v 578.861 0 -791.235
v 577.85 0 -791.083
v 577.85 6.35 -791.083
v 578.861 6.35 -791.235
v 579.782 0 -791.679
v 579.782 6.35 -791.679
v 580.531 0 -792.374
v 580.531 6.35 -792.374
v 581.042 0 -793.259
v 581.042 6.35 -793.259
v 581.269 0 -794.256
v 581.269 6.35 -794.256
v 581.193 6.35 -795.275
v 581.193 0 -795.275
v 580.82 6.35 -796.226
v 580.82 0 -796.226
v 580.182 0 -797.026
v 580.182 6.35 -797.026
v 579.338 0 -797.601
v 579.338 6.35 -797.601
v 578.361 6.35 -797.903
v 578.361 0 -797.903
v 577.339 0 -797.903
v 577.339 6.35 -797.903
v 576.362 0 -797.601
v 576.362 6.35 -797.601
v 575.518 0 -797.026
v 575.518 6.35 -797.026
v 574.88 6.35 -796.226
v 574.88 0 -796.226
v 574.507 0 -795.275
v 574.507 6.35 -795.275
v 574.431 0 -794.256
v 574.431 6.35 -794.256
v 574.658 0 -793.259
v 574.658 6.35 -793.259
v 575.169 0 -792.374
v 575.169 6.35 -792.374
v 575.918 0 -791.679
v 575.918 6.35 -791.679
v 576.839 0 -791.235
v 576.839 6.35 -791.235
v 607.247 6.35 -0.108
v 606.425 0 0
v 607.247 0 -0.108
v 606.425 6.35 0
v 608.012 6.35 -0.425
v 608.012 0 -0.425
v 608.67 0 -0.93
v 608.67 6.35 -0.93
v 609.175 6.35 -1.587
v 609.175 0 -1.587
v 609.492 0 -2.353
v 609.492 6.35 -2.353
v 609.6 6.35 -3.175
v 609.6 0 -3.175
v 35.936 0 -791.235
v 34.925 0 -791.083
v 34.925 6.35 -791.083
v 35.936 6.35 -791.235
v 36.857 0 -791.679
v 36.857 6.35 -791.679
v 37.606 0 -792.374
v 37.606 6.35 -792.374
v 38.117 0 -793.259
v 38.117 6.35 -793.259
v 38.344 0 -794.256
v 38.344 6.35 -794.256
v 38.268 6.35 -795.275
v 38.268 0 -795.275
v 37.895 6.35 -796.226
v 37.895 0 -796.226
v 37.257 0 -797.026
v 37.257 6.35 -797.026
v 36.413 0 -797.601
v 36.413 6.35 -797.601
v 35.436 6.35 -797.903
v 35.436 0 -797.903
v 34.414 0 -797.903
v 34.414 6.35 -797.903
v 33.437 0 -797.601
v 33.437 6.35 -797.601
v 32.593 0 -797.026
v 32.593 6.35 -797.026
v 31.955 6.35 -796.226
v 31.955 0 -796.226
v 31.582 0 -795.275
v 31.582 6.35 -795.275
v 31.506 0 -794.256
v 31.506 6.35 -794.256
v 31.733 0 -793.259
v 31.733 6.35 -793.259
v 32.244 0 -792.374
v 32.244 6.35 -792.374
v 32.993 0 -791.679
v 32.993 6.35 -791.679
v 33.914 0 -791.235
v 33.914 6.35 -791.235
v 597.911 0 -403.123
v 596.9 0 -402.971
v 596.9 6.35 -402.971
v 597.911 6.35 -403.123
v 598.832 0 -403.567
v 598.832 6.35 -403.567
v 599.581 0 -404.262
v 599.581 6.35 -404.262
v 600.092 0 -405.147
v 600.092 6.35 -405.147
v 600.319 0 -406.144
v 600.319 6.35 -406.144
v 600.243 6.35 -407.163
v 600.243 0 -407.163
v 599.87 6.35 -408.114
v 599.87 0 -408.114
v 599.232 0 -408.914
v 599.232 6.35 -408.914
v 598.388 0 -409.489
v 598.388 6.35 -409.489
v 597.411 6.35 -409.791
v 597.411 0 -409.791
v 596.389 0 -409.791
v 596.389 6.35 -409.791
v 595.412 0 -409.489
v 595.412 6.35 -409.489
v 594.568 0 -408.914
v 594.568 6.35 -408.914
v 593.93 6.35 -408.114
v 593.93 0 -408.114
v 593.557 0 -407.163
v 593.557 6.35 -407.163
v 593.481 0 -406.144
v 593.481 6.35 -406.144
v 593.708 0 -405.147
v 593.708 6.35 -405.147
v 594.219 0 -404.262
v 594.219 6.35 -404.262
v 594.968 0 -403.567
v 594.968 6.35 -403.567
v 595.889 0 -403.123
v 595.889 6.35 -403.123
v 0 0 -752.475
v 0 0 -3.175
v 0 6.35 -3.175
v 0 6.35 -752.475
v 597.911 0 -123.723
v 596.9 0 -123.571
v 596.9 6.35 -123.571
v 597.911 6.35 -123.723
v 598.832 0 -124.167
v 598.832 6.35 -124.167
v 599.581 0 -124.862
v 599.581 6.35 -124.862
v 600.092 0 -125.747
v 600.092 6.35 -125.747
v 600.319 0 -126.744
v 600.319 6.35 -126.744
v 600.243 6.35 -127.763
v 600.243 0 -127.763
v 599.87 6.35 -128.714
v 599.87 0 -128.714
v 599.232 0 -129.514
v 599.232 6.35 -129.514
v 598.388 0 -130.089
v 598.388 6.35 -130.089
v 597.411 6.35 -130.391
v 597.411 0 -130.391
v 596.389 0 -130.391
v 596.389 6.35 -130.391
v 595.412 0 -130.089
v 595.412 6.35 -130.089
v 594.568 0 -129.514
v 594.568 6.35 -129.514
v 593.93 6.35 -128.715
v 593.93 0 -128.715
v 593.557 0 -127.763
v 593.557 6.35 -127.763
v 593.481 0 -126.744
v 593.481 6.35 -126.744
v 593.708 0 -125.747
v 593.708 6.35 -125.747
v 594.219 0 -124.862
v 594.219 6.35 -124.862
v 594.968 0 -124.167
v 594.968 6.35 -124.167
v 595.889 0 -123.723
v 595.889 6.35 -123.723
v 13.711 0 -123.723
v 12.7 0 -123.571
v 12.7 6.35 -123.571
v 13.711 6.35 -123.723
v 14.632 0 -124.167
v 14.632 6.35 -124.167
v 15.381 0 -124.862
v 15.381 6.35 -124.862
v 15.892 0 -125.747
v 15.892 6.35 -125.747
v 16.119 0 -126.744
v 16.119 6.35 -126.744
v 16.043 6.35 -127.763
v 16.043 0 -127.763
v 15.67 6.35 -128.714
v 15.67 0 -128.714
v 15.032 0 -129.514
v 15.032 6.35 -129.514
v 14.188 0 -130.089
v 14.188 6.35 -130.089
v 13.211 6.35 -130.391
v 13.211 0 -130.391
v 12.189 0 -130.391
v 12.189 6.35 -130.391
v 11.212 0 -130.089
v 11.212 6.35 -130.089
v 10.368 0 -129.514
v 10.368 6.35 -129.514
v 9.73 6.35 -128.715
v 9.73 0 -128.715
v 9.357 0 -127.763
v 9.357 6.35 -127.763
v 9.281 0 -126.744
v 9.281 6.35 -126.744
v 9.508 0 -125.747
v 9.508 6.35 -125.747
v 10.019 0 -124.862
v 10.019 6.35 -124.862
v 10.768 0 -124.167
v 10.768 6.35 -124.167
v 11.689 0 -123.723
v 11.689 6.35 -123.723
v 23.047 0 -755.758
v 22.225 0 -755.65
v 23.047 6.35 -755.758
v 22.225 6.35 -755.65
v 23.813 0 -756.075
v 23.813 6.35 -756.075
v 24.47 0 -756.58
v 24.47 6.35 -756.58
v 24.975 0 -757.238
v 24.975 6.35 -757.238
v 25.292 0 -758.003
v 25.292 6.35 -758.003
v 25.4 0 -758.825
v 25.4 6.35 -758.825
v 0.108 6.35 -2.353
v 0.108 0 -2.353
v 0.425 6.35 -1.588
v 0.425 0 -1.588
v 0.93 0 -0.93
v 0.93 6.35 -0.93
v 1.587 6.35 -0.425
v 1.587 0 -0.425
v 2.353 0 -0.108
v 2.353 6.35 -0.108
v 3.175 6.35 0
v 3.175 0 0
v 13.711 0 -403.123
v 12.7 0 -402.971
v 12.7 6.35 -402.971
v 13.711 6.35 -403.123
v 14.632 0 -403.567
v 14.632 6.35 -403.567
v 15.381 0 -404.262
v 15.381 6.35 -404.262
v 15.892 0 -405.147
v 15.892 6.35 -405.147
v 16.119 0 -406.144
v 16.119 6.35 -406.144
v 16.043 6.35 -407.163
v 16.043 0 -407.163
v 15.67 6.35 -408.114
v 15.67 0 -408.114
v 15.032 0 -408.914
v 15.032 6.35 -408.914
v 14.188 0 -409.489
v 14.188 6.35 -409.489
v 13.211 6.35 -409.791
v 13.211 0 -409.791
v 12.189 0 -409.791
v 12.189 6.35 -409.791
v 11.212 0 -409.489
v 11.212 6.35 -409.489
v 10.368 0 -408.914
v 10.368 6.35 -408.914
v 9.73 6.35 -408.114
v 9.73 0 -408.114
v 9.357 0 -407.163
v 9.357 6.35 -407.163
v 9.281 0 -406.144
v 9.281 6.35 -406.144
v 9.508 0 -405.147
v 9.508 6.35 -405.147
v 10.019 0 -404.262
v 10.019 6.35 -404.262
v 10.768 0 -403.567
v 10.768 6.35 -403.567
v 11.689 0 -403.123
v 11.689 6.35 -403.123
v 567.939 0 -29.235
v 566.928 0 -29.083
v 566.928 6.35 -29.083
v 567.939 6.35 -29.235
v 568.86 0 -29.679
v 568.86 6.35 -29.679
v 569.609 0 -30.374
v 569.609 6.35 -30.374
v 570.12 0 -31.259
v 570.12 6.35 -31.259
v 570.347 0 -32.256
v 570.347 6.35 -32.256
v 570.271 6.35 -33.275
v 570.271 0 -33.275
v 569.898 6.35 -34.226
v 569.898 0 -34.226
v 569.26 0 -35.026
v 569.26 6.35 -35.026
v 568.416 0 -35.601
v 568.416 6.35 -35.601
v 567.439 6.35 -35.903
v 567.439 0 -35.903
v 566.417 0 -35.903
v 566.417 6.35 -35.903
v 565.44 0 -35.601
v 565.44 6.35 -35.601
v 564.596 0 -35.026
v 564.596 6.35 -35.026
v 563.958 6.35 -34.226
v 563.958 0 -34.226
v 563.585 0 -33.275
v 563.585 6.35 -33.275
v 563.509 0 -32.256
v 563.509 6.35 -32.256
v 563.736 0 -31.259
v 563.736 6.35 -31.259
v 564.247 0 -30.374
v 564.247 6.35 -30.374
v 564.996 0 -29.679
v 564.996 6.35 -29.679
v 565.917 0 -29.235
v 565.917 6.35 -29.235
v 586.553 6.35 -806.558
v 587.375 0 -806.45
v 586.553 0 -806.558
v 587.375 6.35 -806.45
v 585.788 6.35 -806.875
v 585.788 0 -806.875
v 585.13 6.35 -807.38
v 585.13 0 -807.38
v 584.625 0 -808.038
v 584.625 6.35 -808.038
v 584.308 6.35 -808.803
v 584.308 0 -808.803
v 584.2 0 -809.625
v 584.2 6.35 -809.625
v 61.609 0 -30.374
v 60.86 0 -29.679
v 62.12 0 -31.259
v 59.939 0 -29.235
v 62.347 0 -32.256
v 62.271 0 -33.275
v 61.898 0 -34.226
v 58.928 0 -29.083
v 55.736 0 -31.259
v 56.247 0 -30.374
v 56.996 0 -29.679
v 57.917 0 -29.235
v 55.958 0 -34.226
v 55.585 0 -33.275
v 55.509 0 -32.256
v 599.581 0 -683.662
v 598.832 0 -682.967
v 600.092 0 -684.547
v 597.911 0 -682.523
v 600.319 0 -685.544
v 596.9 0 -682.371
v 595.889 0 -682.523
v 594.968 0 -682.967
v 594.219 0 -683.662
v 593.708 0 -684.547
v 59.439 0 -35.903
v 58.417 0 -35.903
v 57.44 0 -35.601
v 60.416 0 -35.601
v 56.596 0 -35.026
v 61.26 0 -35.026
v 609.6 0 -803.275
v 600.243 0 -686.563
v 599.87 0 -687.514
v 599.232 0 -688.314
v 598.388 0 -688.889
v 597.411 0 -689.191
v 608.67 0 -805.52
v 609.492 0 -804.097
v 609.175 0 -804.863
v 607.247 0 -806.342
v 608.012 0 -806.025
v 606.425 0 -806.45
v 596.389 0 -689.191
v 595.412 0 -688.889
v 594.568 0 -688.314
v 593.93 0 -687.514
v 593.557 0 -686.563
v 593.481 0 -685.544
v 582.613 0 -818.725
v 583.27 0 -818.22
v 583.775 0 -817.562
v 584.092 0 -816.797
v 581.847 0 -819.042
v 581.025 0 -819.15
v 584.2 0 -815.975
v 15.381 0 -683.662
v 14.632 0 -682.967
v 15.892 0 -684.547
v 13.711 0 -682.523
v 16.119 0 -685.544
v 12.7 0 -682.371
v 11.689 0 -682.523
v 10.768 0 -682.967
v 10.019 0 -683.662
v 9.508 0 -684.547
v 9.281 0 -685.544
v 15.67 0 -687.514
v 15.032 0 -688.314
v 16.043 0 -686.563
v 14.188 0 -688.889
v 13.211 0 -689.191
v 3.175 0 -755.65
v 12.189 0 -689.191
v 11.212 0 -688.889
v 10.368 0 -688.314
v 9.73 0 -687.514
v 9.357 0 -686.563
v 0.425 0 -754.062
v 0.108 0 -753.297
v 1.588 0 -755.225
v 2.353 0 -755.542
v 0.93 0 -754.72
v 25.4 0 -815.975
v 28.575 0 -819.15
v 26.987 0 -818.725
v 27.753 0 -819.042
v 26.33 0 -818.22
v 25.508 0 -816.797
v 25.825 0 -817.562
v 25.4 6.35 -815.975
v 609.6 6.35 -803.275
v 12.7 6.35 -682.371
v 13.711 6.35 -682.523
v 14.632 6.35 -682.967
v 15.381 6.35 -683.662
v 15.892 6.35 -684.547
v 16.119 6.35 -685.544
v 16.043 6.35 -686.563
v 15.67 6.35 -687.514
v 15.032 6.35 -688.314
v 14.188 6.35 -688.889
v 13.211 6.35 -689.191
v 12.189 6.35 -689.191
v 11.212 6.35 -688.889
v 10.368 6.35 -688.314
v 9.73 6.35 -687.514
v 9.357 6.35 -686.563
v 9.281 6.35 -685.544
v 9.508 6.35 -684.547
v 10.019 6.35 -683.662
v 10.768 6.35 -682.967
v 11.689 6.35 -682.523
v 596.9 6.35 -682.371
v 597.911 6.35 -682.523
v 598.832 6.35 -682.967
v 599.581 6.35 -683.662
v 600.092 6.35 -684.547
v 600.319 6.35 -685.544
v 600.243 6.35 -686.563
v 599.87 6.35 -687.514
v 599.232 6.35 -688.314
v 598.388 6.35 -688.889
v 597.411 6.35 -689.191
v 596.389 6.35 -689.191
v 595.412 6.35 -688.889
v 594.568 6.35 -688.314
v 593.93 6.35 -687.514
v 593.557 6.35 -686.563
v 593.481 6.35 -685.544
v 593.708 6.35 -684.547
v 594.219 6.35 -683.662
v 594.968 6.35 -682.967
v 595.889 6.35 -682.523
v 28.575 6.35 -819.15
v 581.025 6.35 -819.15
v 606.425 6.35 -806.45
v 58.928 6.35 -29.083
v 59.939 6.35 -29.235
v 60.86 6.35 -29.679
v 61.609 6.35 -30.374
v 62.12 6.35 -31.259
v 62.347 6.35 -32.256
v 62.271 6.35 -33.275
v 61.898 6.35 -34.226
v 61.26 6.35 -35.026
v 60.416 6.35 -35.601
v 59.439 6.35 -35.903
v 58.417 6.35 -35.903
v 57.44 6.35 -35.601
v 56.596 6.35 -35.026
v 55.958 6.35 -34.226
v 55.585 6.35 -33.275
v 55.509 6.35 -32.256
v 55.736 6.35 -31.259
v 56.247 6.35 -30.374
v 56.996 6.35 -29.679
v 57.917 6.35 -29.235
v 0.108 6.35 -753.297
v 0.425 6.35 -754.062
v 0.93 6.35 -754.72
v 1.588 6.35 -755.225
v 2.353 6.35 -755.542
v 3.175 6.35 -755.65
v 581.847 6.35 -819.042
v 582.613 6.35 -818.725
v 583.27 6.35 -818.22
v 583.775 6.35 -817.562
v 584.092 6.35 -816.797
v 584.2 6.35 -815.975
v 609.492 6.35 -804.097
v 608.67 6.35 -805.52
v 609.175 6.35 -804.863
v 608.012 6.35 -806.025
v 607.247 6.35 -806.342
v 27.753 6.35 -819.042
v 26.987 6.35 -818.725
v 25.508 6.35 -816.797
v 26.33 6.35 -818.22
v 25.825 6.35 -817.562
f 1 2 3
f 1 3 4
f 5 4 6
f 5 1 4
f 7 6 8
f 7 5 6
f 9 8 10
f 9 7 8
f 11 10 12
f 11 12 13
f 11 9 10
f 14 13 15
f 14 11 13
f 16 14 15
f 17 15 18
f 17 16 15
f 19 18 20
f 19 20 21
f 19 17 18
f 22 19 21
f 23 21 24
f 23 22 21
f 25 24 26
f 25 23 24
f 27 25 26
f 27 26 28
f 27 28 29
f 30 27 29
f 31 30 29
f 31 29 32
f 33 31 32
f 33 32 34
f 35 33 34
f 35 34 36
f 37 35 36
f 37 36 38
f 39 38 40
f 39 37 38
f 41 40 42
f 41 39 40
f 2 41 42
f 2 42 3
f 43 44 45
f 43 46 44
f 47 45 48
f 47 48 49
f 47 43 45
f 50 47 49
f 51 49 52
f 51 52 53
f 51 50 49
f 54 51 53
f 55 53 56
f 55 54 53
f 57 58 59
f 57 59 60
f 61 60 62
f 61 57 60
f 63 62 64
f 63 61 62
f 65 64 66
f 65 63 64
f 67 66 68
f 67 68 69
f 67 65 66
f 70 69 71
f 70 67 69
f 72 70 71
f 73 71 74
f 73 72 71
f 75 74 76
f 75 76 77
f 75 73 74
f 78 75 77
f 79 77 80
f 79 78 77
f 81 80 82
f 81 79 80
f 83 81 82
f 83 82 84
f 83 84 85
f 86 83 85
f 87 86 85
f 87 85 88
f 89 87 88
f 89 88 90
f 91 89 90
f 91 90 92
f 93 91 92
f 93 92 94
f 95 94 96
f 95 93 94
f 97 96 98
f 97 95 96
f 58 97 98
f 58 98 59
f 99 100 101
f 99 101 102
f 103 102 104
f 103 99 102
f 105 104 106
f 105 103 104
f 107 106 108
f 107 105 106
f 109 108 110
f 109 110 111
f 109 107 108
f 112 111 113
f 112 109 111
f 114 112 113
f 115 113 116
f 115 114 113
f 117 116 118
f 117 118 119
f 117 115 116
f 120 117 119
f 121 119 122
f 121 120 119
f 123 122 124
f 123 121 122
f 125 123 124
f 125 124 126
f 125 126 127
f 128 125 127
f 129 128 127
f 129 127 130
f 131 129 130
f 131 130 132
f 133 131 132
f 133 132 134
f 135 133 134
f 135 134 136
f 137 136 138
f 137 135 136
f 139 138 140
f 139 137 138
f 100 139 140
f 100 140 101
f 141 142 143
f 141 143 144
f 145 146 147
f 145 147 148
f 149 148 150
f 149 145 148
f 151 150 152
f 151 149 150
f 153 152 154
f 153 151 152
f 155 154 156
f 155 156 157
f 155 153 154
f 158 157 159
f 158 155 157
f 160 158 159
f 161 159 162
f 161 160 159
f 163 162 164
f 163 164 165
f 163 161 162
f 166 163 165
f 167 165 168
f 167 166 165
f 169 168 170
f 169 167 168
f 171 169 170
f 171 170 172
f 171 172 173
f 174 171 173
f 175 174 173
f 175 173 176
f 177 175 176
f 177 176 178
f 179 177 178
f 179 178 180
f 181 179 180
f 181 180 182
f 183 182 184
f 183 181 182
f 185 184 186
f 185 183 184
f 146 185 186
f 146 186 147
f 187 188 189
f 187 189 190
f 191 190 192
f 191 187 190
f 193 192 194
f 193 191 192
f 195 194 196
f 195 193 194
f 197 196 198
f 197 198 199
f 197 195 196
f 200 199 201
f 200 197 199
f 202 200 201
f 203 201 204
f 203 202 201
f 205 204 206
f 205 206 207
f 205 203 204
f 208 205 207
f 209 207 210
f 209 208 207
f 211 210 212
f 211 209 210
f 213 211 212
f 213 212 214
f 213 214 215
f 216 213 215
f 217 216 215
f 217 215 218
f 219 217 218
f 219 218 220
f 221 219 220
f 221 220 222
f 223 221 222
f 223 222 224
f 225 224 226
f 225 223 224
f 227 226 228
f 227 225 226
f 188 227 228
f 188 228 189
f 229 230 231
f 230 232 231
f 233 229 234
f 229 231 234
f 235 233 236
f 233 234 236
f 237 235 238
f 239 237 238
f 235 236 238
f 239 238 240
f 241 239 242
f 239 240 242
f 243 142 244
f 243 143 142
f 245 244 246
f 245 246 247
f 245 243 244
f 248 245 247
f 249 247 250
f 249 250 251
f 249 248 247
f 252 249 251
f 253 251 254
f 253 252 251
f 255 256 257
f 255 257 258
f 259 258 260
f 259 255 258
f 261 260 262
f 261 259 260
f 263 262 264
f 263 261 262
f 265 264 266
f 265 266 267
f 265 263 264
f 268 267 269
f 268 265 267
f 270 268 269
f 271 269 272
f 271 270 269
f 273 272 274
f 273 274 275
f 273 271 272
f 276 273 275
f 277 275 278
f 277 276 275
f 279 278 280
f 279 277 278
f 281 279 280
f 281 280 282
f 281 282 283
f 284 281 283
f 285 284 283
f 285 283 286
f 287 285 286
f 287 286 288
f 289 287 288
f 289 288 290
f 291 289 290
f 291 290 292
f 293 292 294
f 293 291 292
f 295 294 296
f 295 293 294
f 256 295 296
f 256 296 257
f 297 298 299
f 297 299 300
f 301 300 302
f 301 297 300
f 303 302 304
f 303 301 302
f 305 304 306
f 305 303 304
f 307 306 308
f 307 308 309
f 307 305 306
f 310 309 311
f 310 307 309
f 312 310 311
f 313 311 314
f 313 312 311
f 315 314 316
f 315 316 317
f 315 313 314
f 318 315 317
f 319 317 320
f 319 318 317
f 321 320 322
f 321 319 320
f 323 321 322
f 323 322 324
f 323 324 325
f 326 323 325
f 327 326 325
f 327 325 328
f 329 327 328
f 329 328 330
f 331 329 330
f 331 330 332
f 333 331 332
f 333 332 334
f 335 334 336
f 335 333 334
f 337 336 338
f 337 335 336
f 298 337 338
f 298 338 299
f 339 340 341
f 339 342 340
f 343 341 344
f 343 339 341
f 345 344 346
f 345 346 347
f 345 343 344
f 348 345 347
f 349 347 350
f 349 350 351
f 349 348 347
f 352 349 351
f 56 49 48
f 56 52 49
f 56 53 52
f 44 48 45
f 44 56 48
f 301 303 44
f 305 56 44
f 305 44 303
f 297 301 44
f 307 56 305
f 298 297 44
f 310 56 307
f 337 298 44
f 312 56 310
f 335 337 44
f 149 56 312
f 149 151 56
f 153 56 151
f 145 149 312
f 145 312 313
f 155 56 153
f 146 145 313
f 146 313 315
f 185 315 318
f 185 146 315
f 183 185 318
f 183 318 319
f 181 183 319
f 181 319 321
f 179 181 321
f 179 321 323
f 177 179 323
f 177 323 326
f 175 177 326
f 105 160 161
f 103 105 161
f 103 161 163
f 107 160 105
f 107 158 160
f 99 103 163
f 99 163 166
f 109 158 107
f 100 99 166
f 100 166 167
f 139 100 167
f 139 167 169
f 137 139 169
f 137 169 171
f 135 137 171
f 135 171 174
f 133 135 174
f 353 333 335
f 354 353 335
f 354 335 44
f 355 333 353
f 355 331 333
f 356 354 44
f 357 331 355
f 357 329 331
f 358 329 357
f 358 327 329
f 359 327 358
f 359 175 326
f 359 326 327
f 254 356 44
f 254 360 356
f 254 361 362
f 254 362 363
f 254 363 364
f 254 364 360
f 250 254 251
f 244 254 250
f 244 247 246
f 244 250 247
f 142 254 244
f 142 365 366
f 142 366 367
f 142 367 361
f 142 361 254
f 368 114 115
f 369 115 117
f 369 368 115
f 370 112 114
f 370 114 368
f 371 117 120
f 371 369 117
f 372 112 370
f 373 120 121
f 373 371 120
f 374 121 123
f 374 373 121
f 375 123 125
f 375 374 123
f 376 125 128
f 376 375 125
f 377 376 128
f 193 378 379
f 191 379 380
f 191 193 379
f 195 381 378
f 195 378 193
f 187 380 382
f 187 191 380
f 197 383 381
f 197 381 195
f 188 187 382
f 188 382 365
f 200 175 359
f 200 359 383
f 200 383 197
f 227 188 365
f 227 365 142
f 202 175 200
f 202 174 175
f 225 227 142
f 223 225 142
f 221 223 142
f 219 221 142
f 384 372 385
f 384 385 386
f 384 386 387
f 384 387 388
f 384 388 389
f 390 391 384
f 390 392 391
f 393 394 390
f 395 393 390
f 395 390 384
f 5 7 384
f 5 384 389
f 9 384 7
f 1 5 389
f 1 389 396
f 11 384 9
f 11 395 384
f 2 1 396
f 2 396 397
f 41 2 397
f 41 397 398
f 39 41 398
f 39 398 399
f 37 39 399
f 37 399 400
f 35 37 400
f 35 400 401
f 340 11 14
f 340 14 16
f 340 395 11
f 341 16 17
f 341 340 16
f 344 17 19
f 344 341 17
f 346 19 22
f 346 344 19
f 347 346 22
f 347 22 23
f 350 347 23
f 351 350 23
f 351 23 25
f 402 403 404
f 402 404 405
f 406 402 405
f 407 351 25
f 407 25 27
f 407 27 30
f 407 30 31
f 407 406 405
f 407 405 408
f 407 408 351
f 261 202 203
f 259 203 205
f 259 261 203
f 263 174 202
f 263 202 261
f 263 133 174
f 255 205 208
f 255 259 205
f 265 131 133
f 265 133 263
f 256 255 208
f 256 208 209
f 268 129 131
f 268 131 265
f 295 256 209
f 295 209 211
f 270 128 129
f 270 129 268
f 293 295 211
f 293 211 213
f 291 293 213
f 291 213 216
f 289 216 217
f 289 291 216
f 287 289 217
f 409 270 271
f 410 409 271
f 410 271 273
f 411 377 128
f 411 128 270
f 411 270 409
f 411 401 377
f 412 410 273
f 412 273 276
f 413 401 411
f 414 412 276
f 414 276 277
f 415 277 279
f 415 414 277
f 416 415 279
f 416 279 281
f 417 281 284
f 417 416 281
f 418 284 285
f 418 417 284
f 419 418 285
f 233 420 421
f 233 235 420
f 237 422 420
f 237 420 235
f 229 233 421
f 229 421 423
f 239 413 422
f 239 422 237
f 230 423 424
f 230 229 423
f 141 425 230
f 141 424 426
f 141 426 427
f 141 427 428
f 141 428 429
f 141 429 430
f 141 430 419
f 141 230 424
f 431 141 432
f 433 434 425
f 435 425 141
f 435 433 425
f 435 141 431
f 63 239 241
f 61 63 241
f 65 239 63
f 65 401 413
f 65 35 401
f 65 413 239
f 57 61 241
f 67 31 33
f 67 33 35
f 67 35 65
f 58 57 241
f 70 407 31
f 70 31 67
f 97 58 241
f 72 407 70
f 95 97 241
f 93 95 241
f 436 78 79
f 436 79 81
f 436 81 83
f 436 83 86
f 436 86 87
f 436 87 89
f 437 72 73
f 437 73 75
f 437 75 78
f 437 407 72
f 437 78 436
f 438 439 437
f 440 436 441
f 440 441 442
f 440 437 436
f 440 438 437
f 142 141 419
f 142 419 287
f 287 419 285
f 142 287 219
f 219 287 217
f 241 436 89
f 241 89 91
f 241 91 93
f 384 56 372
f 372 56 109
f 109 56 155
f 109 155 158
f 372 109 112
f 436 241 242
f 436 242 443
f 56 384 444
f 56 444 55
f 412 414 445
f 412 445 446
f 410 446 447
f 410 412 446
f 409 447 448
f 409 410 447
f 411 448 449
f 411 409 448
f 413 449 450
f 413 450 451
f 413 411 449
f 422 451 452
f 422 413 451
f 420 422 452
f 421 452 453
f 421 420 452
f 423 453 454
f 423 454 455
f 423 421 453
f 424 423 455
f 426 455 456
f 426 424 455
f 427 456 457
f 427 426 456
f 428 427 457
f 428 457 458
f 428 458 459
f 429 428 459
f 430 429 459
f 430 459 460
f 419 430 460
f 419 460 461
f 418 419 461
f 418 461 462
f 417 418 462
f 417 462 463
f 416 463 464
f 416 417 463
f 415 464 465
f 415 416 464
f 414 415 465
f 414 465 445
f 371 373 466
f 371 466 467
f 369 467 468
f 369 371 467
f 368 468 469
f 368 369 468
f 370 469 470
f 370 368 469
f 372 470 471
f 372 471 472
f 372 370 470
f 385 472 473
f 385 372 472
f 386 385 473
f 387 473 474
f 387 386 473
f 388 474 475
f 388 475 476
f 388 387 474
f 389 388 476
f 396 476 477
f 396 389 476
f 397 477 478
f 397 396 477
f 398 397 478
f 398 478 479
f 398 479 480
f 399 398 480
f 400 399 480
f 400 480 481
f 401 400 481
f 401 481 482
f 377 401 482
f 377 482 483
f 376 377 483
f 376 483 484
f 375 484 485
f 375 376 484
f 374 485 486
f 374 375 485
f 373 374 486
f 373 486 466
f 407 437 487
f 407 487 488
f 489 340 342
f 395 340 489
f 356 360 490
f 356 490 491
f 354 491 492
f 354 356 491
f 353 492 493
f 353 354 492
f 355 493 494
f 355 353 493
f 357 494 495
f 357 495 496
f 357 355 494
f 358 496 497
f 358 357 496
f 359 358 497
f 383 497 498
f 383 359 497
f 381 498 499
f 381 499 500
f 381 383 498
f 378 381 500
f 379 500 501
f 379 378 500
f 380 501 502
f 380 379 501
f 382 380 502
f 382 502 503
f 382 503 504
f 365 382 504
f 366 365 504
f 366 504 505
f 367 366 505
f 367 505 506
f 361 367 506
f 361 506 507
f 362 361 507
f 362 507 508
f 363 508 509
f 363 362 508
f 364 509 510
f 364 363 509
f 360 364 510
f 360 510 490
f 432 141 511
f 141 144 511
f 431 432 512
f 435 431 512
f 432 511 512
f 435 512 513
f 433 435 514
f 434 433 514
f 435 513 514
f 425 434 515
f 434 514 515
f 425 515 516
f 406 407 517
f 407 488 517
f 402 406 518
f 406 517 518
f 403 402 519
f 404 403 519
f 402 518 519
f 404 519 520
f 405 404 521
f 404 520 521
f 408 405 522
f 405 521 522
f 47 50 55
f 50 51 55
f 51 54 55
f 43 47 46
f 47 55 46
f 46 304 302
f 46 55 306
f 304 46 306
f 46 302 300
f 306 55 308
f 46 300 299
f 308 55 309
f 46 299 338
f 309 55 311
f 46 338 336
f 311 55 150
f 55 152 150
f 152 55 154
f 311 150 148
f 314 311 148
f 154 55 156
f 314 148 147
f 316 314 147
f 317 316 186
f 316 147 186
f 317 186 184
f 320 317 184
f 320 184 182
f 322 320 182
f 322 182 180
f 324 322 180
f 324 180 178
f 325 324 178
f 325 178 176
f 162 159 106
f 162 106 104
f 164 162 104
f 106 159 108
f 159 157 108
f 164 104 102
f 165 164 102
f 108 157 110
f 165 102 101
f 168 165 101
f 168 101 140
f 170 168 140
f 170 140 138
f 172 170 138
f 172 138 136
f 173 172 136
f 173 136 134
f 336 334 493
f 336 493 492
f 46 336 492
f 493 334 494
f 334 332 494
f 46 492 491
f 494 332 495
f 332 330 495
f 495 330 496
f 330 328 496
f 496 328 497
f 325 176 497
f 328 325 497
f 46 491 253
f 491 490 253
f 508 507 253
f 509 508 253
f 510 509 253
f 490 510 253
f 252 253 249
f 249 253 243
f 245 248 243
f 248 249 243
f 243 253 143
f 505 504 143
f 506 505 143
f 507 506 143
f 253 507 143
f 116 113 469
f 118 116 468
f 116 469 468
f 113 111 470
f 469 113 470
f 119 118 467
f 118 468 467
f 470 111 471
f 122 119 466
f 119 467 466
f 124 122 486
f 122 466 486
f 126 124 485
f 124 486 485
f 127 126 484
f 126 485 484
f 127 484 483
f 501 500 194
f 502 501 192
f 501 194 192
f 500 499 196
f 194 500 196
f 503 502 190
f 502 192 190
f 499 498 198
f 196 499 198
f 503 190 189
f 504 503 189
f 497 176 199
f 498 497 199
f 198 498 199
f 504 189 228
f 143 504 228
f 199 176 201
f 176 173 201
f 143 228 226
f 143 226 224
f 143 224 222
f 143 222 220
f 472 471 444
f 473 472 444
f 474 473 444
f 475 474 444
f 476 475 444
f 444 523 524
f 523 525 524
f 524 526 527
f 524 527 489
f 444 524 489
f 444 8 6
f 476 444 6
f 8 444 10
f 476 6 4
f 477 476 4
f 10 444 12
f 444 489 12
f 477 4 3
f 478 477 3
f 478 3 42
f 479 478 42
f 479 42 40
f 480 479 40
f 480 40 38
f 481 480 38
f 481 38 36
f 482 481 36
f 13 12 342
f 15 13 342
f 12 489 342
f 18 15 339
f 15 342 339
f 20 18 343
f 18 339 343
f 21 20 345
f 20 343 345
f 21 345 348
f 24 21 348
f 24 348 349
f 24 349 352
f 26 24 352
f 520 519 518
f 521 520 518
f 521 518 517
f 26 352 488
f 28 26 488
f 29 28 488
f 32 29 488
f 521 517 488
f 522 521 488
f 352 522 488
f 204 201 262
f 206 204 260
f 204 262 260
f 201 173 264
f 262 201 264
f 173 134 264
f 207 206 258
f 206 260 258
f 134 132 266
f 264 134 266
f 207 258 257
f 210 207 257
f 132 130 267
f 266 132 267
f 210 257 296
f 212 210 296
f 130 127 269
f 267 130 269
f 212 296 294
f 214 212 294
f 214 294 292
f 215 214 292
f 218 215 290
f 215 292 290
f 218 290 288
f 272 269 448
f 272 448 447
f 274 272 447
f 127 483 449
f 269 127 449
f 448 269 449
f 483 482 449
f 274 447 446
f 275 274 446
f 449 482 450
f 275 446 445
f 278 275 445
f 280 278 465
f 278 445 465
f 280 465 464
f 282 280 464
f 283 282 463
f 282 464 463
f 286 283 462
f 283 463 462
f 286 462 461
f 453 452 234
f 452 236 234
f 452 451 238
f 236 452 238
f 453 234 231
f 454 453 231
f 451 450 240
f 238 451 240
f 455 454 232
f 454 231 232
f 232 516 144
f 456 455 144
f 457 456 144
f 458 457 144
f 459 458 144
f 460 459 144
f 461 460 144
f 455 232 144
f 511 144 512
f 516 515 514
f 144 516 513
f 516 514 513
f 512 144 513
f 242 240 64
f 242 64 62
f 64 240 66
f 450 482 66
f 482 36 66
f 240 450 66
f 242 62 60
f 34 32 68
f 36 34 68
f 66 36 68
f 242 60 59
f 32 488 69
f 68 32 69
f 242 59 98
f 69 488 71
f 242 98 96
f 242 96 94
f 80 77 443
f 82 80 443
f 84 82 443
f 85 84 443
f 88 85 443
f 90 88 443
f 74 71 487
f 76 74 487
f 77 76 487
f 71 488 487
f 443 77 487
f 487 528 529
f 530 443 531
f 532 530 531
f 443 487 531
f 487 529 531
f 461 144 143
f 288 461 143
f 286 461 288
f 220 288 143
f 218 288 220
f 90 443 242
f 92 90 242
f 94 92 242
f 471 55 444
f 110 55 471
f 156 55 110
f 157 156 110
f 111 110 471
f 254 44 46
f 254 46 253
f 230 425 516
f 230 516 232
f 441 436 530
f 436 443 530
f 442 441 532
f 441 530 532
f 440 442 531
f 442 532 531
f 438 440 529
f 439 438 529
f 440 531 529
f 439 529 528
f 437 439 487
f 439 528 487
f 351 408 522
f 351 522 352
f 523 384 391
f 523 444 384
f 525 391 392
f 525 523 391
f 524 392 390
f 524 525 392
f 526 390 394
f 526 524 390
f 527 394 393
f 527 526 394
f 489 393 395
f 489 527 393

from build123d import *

# Parameters (mm, degrees)
SKETCH1_R           = 3.429
BOSS_EXTRUDE1_DEPTH = 6.35
FILLET1_R           = 3.175


with BuildPart() as part:
    # Sketch1 → Boss-Extrude1 (new body)
    with BuildSketch(Plane(origin=(0, 0, 0), x_dir=(1, 0, 0), z_dir=(0, 1, 0))):
        Polygon((0, 0), (0, 755.65), (25.4, 755.65), (25.4, 819.15), (584.2, 819.15), (584.2, 806.45), (609.6, 806.45), (609.6, 0), align=None)
        with Locations(Location((12.7, 685.8, 0), (0, 0, 270))):
            Circle(SKETCH1_R, mode=Mode.SUBTRACT)
        with Locations(Location((12.7, 127, 0), (0, 0, 270))):
            Circle(SKETCH1_R, mode=Mode.SUBTRACT)
        with Locations(Location((577.85, 794.512, 0), (0, 0, 270))):
            Circle(SKETCH1_R, mode=Mode.SUBTRACT)
        with Locations(Location((566.928, 32.512, 0), (0, 0, 270))):
            Circle(SKETCH1_R, mode=Mode.SUBTRACT)
        with Locations(Location((596.9, 685.8, 0), (0, 0, 270))):
            Circle(SKETCH1_R, mode=Mode.SUBTRACT)
        with Locations(Location((596.9, 406.4, 0), (0, 0, 270))):
            Circle(SKETCH1_R, mode=Mode.SUBTRACT)
        with Locations(Location((34.925, 794.512, 0), (0, 0, 270))):
            Circle(SKETCH1_R, mode=Mode.SUBTRACT)
        with Locations(Location((58.928, 32.512, 0), (0, 0, 270))):
            Circle(SKETCH1_R, mode=Mode.SUBTRACT)
        with Locations(Location((596.9, 127, 0), (0, 0, 270))):
            Circle(SKETCH1_R, mode=Mode.SUBTRACT)
        with Locations(Location((12.7, 406.4, 0), (0, 0, 270))):
            Circle(SKETCH1_R, mode=Mode.SUBTRACT)
    extrude(amount=BOSS_EXTRUDE1_DEPTH)

    # Fillet1
    fillet1_edges = [part.edges().sort_by_distance(p)[0] for p in [
        (0, 3.175, 0),
        (0, 3.175, -755.65),
        (25.4, 3.175, -755.65),
        (25.4, 3.175, -819.15),
        (584.2, 3.175, -819.15),
        (584.2, 3.175, -806.45),
        (609.6, 3.175, -806.45),
        (609.6, 3.175, 0),
    ]]
    fillet(fillet1_edges, radius=FILLET1_R)


solid = part.part
